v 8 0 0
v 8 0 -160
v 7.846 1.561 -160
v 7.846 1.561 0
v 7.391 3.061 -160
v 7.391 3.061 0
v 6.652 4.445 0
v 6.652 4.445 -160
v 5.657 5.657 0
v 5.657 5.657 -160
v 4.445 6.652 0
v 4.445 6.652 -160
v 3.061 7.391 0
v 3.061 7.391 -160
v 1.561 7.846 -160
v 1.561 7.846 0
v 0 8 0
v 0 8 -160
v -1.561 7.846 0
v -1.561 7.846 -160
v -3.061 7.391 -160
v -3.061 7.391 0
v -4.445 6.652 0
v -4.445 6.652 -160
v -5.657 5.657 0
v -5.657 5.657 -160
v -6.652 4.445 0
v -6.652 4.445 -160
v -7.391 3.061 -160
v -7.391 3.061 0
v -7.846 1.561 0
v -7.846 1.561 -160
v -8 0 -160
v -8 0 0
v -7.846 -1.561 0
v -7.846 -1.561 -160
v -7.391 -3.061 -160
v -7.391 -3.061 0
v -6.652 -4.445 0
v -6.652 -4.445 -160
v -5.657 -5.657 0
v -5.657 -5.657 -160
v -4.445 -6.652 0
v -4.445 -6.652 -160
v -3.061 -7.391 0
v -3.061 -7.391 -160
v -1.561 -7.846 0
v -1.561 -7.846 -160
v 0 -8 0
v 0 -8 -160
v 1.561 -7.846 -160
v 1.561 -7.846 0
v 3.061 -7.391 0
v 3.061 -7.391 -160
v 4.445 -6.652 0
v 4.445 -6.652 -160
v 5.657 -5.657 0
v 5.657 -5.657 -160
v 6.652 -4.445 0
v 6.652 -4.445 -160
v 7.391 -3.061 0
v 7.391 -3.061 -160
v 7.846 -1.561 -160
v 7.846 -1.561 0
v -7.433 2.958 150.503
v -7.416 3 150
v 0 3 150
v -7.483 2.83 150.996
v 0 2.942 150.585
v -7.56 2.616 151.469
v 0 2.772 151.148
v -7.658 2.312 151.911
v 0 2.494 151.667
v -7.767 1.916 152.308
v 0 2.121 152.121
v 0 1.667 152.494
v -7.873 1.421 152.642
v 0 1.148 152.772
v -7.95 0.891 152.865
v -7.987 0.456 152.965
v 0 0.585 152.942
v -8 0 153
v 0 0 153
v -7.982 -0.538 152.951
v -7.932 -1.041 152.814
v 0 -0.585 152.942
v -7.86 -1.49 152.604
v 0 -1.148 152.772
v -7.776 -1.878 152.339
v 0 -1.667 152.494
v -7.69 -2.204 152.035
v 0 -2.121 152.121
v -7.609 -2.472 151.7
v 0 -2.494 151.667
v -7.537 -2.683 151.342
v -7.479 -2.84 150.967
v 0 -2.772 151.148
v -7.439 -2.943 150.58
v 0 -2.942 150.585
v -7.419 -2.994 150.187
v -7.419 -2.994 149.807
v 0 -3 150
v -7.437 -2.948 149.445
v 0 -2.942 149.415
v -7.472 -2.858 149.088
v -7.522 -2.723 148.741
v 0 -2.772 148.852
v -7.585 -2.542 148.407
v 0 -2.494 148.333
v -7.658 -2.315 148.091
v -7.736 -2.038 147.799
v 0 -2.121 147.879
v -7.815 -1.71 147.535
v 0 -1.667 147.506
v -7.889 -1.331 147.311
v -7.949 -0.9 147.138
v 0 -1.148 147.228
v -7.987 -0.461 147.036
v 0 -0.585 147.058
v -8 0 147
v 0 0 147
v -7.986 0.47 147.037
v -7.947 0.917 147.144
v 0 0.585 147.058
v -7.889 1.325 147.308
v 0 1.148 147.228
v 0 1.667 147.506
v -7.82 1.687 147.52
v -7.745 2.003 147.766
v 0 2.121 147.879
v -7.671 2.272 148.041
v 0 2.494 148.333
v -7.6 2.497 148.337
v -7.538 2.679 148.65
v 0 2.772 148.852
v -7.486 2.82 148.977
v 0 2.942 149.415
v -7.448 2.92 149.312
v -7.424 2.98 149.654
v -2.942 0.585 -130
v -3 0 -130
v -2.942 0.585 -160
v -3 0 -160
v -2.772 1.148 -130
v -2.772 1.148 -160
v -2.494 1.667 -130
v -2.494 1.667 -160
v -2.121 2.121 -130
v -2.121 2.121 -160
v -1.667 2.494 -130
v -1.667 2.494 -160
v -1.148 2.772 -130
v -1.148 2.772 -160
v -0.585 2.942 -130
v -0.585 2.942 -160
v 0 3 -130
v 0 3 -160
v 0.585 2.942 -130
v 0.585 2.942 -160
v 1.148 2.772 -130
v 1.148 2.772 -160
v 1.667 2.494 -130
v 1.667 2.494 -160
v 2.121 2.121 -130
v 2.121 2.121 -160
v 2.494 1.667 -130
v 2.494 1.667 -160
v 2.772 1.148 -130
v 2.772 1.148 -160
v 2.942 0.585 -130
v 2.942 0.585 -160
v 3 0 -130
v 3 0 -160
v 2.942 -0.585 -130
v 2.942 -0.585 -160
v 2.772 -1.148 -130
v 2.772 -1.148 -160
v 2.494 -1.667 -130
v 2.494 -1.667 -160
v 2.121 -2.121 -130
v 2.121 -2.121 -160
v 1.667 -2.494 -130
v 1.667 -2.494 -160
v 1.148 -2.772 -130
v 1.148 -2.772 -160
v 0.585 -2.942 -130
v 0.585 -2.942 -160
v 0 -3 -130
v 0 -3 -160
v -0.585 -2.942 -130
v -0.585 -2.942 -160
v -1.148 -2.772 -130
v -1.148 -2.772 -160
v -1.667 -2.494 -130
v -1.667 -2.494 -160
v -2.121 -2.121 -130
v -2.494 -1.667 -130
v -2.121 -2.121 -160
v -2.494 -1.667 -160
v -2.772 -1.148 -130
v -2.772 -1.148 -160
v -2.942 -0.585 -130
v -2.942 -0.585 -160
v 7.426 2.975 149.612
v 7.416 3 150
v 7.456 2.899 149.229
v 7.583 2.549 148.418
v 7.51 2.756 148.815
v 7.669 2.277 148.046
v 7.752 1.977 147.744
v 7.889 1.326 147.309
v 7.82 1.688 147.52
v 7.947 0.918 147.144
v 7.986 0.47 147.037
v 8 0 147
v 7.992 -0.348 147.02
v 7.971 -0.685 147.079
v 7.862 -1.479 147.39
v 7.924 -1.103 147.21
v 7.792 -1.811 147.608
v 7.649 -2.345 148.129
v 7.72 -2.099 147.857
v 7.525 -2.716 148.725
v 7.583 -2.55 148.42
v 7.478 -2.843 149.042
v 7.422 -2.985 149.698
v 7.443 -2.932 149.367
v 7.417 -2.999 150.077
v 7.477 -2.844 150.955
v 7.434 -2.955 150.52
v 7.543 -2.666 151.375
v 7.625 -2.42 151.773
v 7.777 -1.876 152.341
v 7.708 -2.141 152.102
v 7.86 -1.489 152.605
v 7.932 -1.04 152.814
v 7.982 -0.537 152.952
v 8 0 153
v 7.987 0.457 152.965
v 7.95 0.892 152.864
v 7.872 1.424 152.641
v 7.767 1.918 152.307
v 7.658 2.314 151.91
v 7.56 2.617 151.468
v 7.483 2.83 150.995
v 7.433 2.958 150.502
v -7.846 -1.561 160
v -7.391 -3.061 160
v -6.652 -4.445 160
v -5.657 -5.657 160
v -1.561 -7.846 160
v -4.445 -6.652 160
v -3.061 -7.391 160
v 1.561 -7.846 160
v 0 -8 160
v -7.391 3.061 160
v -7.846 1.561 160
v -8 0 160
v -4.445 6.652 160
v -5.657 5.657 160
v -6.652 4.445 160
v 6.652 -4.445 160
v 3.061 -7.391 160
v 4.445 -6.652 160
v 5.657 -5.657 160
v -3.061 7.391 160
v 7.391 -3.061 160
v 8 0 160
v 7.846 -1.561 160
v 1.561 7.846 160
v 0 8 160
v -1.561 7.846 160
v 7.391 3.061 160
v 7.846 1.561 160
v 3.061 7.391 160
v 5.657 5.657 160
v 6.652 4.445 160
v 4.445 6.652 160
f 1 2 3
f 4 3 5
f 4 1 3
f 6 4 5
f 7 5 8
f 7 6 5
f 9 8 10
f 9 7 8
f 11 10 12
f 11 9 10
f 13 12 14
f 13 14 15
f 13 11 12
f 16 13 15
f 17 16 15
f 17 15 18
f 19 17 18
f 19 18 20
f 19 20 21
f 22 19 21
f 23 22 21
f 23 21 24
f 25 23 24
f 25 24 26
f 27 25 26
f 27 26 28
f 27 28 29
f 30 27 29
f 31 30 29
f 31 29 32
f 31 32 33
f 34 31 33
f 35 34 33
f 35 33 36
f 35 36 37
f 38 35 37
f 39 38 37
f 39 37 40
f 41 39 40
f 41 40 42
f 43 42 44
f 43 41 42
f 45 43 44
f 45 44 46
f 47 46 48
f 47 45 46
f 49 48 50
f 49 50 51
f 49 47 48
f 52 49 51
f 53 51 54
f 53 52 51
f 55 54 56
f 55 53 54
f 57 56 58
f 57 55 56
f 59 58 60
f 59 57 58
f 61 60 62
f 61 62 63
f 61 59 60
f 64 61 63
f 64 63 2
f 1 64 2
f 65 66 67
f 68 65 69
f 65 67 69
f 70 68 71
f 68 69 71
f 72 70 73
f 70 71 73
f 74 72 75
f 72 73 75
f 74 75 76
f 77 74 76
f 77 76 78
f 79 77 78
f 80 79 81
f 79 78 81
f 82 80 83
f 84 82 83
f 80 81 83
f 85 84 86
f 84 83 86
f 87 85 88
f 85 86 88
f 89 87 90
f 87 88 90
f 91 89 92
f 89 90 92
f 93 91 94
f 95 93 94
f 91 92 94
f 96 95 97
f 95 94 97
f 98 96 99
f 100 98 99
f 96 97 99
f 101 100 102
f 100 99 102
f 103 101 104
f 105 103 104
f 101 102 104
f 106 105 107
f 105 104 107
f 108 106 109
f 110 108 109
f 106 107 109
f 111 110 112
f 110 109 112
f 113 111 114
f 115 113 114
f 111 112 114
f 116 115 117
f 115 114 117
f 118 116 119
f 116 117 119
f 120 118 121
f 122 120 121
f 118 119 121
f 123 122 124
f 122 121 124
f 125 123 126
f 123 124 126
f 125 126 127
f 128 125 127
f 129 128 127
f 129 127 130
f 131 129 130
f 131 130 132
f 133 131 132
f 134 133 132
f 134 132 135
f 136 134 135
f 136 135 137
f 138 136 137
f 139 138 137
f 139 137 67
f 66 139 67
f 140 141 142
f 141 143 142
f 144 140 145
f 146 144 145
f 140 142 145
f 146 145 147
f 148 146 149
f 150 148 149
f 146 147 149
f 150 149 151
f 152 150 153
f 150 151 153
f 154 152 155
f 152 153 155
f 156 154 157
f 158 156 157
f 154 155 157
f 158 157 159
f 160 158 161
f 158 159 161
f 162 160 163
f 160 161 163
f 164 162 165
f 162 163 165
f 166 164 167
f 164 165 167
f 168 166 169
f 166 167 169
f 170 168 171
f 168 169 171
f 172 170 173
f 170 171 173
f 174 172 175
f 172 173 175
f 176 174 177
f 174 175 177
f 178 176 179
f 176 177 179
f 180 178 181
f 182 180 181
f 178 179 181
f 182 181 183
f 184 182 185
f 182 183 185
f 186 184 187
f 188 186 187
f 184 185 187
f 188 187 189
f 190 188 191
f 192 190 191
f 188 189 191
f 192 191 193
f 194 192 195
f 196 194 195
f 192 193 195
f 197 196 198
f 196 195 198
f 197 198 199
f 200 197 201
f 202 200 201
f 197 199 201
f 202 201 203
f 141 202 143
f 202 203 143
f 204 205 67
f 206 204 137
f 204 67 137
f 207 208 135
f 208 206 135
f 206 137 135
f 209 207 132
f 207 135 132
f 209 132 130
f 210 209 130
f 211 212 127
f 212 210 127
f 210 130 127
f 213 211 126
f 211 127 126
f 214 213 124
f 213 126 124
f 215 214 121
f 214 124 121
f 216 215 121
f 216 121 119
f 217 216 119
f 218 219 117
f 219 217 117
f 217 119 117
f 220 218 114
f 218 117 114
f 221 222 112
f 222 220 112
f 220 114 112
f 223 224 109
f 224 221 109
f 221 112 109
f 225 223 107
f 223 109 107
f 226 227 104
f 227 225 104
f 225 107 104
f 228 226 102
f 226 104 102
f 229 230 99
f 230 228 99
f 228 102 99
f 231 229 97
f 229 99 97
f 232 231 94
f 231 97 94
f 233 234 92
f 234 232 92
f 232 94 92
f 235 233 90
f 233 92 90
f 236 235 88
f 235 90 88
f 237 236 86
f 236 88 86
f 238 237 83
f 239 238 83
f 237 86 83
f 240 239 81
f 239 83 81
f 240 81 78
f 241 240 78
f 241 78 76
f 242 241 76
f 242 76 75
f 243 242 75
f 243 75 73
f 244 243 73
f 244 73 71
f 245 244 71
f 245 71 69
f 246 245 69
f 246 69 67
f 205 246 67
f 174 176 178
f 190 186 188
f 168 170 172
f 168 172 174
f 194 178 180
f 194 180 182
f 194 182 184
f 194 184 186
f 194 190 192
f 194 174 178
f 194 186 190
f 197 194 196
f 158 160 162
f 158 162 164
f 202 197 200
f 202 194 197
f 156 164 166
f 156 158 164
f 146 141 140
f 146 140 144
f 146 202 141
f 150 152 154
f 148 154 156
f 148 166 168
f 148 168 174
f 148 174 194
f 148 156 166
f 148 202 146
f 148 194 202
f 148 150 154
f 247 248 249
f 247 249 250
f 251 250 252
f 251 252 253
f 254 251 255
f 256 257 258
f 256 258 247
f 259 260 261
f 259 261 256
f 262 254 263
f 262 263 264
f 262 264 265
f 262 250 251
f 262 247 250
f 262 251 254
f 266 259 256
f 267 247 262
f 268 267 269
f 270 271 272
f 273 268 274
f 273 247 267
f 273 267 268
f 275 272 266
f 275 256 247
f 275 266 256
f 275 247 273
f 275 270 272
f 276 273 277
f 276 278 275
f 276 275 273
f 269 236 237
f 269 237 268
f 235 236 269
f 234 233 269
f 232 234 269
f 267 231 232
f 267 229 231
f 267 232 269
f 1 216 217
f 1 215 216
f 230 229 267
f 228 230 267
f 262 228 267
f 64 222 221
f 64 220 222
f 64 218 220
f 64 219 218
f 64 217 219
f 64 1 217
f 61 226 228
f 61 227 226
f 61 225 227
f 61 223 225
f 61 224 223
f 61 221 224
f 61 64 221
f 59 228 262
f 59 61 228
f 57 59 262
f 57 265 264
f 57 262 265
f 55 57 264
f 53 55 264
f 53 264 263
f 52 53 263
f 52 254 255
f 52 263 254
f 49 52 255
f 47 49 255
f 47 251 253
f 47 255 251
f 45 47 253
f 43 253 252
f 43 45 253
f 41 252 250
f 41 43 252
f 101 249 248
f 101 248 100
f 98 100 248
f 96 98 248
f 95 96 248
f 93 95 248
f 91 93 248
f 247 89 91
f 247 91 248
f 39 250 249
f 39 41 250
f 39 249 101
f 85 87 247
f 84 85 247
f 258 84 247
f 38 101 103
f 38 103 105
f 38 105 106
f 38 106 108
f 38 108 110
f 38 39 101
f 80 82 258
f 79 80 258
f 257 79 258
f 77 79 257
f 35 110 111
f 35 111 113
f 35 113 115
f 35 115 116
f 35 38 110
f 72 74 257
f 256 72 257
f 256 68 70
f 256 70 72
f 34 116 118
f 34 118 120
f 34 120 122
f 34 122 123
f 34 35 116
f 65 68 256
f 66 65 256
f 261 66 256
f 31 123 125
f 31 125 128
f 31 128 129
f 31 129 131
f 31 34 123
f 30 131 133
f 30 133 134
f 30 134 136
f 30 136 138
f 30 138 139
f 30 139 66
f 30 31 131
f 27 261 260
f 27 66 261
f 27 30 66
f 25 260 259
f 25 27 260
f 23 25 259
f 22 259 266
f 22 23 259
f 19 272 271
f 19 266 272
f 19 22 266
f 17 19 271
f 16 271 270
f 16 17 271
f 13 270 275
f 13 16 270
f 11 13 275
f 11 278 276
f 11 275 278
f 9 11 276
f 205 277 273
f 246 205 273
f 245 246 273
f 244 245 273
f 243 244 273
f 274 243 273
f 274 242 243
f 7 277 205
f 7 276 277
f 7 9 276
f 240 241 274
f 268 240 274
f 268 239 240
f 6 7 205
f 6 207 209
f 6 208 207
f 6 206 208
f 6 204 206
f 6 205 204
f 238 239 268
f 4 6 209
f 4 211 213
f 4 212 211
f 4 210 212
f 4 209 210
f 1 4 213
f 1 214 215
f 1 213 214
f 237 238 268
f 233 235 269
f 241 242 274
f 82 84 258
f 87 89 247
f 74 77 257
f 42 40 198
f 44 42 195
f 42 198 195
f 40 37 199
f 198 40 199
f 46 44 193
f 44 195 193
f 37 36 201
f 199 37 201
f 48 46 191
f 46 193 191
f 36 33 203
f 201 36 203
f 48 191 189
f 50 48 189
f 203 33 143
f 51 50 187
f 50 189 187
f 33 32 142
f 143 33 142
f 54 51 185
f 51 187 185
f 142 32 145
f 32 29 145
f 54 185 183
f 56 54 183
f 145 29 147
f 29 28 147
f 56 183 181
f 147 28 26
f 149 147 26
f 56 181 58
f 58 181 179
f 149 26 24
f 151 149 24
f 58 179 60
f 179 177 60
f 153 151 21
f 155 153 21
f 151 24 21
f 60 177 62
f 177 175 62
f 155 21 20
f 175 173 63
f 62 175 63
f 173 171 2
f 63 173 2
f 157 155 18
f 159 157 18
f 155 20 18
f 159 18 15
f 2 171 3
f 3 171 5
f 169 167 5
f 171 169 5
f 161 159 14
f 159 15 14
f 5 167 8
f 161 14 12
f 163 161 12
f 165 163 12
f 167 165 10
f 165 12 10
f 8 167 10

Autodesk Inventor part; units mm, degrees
ref_plane "YZ Plane" through (0, 0, 0) normal (1, 0, 0) x (0, 1, 0)
ref_plane "XZ Plane" through (0, 0, 0) normal (0, 1, 0) x (-1, 0, 0)
ref_plane "XY Plane" through (0, 0, 0) normal (0, 0, 1) x (1, 0, 0)
sketch "Skizze1" plane through (0, 0, 0) normal (0, 0, 1) x (1, 0, 0)
  circle A0 centre (0, 0) radius 8
  dimension "d0" = 16
extrude "Extrusion1" add sketch "Skizze1" along normal mid plane 320
sketch "Skizze6" plane through (0, 0, 0) normal (1, 0, 0) x (0, 1, 0)
  circle A0 centre (0, 150) radius 3
  line L0 (-4.2, 0) -> (4.2, 0) projected
  point P0 (0, 0)
  dimension "d16" = 6
  dimension "d19" = 150
extrude "Extrusion4" cut sketch "Skizze6" along normal mid plane 16
sketch "Skizze7" plane through (0, 0, -160) normal (0, 0, -1) x (-1, 0, 0)
  circle A0 centre (0, 0) radius 3
  dimension "d20" = 6
extrude "Extrusion5" cut sketch "Skizze7" against normal blind 30
thread "Gewinde2" size "M6x1" class "6H" standard "ANSI Metric M Profile" full length
properties part number "Hauptpfeiler"
